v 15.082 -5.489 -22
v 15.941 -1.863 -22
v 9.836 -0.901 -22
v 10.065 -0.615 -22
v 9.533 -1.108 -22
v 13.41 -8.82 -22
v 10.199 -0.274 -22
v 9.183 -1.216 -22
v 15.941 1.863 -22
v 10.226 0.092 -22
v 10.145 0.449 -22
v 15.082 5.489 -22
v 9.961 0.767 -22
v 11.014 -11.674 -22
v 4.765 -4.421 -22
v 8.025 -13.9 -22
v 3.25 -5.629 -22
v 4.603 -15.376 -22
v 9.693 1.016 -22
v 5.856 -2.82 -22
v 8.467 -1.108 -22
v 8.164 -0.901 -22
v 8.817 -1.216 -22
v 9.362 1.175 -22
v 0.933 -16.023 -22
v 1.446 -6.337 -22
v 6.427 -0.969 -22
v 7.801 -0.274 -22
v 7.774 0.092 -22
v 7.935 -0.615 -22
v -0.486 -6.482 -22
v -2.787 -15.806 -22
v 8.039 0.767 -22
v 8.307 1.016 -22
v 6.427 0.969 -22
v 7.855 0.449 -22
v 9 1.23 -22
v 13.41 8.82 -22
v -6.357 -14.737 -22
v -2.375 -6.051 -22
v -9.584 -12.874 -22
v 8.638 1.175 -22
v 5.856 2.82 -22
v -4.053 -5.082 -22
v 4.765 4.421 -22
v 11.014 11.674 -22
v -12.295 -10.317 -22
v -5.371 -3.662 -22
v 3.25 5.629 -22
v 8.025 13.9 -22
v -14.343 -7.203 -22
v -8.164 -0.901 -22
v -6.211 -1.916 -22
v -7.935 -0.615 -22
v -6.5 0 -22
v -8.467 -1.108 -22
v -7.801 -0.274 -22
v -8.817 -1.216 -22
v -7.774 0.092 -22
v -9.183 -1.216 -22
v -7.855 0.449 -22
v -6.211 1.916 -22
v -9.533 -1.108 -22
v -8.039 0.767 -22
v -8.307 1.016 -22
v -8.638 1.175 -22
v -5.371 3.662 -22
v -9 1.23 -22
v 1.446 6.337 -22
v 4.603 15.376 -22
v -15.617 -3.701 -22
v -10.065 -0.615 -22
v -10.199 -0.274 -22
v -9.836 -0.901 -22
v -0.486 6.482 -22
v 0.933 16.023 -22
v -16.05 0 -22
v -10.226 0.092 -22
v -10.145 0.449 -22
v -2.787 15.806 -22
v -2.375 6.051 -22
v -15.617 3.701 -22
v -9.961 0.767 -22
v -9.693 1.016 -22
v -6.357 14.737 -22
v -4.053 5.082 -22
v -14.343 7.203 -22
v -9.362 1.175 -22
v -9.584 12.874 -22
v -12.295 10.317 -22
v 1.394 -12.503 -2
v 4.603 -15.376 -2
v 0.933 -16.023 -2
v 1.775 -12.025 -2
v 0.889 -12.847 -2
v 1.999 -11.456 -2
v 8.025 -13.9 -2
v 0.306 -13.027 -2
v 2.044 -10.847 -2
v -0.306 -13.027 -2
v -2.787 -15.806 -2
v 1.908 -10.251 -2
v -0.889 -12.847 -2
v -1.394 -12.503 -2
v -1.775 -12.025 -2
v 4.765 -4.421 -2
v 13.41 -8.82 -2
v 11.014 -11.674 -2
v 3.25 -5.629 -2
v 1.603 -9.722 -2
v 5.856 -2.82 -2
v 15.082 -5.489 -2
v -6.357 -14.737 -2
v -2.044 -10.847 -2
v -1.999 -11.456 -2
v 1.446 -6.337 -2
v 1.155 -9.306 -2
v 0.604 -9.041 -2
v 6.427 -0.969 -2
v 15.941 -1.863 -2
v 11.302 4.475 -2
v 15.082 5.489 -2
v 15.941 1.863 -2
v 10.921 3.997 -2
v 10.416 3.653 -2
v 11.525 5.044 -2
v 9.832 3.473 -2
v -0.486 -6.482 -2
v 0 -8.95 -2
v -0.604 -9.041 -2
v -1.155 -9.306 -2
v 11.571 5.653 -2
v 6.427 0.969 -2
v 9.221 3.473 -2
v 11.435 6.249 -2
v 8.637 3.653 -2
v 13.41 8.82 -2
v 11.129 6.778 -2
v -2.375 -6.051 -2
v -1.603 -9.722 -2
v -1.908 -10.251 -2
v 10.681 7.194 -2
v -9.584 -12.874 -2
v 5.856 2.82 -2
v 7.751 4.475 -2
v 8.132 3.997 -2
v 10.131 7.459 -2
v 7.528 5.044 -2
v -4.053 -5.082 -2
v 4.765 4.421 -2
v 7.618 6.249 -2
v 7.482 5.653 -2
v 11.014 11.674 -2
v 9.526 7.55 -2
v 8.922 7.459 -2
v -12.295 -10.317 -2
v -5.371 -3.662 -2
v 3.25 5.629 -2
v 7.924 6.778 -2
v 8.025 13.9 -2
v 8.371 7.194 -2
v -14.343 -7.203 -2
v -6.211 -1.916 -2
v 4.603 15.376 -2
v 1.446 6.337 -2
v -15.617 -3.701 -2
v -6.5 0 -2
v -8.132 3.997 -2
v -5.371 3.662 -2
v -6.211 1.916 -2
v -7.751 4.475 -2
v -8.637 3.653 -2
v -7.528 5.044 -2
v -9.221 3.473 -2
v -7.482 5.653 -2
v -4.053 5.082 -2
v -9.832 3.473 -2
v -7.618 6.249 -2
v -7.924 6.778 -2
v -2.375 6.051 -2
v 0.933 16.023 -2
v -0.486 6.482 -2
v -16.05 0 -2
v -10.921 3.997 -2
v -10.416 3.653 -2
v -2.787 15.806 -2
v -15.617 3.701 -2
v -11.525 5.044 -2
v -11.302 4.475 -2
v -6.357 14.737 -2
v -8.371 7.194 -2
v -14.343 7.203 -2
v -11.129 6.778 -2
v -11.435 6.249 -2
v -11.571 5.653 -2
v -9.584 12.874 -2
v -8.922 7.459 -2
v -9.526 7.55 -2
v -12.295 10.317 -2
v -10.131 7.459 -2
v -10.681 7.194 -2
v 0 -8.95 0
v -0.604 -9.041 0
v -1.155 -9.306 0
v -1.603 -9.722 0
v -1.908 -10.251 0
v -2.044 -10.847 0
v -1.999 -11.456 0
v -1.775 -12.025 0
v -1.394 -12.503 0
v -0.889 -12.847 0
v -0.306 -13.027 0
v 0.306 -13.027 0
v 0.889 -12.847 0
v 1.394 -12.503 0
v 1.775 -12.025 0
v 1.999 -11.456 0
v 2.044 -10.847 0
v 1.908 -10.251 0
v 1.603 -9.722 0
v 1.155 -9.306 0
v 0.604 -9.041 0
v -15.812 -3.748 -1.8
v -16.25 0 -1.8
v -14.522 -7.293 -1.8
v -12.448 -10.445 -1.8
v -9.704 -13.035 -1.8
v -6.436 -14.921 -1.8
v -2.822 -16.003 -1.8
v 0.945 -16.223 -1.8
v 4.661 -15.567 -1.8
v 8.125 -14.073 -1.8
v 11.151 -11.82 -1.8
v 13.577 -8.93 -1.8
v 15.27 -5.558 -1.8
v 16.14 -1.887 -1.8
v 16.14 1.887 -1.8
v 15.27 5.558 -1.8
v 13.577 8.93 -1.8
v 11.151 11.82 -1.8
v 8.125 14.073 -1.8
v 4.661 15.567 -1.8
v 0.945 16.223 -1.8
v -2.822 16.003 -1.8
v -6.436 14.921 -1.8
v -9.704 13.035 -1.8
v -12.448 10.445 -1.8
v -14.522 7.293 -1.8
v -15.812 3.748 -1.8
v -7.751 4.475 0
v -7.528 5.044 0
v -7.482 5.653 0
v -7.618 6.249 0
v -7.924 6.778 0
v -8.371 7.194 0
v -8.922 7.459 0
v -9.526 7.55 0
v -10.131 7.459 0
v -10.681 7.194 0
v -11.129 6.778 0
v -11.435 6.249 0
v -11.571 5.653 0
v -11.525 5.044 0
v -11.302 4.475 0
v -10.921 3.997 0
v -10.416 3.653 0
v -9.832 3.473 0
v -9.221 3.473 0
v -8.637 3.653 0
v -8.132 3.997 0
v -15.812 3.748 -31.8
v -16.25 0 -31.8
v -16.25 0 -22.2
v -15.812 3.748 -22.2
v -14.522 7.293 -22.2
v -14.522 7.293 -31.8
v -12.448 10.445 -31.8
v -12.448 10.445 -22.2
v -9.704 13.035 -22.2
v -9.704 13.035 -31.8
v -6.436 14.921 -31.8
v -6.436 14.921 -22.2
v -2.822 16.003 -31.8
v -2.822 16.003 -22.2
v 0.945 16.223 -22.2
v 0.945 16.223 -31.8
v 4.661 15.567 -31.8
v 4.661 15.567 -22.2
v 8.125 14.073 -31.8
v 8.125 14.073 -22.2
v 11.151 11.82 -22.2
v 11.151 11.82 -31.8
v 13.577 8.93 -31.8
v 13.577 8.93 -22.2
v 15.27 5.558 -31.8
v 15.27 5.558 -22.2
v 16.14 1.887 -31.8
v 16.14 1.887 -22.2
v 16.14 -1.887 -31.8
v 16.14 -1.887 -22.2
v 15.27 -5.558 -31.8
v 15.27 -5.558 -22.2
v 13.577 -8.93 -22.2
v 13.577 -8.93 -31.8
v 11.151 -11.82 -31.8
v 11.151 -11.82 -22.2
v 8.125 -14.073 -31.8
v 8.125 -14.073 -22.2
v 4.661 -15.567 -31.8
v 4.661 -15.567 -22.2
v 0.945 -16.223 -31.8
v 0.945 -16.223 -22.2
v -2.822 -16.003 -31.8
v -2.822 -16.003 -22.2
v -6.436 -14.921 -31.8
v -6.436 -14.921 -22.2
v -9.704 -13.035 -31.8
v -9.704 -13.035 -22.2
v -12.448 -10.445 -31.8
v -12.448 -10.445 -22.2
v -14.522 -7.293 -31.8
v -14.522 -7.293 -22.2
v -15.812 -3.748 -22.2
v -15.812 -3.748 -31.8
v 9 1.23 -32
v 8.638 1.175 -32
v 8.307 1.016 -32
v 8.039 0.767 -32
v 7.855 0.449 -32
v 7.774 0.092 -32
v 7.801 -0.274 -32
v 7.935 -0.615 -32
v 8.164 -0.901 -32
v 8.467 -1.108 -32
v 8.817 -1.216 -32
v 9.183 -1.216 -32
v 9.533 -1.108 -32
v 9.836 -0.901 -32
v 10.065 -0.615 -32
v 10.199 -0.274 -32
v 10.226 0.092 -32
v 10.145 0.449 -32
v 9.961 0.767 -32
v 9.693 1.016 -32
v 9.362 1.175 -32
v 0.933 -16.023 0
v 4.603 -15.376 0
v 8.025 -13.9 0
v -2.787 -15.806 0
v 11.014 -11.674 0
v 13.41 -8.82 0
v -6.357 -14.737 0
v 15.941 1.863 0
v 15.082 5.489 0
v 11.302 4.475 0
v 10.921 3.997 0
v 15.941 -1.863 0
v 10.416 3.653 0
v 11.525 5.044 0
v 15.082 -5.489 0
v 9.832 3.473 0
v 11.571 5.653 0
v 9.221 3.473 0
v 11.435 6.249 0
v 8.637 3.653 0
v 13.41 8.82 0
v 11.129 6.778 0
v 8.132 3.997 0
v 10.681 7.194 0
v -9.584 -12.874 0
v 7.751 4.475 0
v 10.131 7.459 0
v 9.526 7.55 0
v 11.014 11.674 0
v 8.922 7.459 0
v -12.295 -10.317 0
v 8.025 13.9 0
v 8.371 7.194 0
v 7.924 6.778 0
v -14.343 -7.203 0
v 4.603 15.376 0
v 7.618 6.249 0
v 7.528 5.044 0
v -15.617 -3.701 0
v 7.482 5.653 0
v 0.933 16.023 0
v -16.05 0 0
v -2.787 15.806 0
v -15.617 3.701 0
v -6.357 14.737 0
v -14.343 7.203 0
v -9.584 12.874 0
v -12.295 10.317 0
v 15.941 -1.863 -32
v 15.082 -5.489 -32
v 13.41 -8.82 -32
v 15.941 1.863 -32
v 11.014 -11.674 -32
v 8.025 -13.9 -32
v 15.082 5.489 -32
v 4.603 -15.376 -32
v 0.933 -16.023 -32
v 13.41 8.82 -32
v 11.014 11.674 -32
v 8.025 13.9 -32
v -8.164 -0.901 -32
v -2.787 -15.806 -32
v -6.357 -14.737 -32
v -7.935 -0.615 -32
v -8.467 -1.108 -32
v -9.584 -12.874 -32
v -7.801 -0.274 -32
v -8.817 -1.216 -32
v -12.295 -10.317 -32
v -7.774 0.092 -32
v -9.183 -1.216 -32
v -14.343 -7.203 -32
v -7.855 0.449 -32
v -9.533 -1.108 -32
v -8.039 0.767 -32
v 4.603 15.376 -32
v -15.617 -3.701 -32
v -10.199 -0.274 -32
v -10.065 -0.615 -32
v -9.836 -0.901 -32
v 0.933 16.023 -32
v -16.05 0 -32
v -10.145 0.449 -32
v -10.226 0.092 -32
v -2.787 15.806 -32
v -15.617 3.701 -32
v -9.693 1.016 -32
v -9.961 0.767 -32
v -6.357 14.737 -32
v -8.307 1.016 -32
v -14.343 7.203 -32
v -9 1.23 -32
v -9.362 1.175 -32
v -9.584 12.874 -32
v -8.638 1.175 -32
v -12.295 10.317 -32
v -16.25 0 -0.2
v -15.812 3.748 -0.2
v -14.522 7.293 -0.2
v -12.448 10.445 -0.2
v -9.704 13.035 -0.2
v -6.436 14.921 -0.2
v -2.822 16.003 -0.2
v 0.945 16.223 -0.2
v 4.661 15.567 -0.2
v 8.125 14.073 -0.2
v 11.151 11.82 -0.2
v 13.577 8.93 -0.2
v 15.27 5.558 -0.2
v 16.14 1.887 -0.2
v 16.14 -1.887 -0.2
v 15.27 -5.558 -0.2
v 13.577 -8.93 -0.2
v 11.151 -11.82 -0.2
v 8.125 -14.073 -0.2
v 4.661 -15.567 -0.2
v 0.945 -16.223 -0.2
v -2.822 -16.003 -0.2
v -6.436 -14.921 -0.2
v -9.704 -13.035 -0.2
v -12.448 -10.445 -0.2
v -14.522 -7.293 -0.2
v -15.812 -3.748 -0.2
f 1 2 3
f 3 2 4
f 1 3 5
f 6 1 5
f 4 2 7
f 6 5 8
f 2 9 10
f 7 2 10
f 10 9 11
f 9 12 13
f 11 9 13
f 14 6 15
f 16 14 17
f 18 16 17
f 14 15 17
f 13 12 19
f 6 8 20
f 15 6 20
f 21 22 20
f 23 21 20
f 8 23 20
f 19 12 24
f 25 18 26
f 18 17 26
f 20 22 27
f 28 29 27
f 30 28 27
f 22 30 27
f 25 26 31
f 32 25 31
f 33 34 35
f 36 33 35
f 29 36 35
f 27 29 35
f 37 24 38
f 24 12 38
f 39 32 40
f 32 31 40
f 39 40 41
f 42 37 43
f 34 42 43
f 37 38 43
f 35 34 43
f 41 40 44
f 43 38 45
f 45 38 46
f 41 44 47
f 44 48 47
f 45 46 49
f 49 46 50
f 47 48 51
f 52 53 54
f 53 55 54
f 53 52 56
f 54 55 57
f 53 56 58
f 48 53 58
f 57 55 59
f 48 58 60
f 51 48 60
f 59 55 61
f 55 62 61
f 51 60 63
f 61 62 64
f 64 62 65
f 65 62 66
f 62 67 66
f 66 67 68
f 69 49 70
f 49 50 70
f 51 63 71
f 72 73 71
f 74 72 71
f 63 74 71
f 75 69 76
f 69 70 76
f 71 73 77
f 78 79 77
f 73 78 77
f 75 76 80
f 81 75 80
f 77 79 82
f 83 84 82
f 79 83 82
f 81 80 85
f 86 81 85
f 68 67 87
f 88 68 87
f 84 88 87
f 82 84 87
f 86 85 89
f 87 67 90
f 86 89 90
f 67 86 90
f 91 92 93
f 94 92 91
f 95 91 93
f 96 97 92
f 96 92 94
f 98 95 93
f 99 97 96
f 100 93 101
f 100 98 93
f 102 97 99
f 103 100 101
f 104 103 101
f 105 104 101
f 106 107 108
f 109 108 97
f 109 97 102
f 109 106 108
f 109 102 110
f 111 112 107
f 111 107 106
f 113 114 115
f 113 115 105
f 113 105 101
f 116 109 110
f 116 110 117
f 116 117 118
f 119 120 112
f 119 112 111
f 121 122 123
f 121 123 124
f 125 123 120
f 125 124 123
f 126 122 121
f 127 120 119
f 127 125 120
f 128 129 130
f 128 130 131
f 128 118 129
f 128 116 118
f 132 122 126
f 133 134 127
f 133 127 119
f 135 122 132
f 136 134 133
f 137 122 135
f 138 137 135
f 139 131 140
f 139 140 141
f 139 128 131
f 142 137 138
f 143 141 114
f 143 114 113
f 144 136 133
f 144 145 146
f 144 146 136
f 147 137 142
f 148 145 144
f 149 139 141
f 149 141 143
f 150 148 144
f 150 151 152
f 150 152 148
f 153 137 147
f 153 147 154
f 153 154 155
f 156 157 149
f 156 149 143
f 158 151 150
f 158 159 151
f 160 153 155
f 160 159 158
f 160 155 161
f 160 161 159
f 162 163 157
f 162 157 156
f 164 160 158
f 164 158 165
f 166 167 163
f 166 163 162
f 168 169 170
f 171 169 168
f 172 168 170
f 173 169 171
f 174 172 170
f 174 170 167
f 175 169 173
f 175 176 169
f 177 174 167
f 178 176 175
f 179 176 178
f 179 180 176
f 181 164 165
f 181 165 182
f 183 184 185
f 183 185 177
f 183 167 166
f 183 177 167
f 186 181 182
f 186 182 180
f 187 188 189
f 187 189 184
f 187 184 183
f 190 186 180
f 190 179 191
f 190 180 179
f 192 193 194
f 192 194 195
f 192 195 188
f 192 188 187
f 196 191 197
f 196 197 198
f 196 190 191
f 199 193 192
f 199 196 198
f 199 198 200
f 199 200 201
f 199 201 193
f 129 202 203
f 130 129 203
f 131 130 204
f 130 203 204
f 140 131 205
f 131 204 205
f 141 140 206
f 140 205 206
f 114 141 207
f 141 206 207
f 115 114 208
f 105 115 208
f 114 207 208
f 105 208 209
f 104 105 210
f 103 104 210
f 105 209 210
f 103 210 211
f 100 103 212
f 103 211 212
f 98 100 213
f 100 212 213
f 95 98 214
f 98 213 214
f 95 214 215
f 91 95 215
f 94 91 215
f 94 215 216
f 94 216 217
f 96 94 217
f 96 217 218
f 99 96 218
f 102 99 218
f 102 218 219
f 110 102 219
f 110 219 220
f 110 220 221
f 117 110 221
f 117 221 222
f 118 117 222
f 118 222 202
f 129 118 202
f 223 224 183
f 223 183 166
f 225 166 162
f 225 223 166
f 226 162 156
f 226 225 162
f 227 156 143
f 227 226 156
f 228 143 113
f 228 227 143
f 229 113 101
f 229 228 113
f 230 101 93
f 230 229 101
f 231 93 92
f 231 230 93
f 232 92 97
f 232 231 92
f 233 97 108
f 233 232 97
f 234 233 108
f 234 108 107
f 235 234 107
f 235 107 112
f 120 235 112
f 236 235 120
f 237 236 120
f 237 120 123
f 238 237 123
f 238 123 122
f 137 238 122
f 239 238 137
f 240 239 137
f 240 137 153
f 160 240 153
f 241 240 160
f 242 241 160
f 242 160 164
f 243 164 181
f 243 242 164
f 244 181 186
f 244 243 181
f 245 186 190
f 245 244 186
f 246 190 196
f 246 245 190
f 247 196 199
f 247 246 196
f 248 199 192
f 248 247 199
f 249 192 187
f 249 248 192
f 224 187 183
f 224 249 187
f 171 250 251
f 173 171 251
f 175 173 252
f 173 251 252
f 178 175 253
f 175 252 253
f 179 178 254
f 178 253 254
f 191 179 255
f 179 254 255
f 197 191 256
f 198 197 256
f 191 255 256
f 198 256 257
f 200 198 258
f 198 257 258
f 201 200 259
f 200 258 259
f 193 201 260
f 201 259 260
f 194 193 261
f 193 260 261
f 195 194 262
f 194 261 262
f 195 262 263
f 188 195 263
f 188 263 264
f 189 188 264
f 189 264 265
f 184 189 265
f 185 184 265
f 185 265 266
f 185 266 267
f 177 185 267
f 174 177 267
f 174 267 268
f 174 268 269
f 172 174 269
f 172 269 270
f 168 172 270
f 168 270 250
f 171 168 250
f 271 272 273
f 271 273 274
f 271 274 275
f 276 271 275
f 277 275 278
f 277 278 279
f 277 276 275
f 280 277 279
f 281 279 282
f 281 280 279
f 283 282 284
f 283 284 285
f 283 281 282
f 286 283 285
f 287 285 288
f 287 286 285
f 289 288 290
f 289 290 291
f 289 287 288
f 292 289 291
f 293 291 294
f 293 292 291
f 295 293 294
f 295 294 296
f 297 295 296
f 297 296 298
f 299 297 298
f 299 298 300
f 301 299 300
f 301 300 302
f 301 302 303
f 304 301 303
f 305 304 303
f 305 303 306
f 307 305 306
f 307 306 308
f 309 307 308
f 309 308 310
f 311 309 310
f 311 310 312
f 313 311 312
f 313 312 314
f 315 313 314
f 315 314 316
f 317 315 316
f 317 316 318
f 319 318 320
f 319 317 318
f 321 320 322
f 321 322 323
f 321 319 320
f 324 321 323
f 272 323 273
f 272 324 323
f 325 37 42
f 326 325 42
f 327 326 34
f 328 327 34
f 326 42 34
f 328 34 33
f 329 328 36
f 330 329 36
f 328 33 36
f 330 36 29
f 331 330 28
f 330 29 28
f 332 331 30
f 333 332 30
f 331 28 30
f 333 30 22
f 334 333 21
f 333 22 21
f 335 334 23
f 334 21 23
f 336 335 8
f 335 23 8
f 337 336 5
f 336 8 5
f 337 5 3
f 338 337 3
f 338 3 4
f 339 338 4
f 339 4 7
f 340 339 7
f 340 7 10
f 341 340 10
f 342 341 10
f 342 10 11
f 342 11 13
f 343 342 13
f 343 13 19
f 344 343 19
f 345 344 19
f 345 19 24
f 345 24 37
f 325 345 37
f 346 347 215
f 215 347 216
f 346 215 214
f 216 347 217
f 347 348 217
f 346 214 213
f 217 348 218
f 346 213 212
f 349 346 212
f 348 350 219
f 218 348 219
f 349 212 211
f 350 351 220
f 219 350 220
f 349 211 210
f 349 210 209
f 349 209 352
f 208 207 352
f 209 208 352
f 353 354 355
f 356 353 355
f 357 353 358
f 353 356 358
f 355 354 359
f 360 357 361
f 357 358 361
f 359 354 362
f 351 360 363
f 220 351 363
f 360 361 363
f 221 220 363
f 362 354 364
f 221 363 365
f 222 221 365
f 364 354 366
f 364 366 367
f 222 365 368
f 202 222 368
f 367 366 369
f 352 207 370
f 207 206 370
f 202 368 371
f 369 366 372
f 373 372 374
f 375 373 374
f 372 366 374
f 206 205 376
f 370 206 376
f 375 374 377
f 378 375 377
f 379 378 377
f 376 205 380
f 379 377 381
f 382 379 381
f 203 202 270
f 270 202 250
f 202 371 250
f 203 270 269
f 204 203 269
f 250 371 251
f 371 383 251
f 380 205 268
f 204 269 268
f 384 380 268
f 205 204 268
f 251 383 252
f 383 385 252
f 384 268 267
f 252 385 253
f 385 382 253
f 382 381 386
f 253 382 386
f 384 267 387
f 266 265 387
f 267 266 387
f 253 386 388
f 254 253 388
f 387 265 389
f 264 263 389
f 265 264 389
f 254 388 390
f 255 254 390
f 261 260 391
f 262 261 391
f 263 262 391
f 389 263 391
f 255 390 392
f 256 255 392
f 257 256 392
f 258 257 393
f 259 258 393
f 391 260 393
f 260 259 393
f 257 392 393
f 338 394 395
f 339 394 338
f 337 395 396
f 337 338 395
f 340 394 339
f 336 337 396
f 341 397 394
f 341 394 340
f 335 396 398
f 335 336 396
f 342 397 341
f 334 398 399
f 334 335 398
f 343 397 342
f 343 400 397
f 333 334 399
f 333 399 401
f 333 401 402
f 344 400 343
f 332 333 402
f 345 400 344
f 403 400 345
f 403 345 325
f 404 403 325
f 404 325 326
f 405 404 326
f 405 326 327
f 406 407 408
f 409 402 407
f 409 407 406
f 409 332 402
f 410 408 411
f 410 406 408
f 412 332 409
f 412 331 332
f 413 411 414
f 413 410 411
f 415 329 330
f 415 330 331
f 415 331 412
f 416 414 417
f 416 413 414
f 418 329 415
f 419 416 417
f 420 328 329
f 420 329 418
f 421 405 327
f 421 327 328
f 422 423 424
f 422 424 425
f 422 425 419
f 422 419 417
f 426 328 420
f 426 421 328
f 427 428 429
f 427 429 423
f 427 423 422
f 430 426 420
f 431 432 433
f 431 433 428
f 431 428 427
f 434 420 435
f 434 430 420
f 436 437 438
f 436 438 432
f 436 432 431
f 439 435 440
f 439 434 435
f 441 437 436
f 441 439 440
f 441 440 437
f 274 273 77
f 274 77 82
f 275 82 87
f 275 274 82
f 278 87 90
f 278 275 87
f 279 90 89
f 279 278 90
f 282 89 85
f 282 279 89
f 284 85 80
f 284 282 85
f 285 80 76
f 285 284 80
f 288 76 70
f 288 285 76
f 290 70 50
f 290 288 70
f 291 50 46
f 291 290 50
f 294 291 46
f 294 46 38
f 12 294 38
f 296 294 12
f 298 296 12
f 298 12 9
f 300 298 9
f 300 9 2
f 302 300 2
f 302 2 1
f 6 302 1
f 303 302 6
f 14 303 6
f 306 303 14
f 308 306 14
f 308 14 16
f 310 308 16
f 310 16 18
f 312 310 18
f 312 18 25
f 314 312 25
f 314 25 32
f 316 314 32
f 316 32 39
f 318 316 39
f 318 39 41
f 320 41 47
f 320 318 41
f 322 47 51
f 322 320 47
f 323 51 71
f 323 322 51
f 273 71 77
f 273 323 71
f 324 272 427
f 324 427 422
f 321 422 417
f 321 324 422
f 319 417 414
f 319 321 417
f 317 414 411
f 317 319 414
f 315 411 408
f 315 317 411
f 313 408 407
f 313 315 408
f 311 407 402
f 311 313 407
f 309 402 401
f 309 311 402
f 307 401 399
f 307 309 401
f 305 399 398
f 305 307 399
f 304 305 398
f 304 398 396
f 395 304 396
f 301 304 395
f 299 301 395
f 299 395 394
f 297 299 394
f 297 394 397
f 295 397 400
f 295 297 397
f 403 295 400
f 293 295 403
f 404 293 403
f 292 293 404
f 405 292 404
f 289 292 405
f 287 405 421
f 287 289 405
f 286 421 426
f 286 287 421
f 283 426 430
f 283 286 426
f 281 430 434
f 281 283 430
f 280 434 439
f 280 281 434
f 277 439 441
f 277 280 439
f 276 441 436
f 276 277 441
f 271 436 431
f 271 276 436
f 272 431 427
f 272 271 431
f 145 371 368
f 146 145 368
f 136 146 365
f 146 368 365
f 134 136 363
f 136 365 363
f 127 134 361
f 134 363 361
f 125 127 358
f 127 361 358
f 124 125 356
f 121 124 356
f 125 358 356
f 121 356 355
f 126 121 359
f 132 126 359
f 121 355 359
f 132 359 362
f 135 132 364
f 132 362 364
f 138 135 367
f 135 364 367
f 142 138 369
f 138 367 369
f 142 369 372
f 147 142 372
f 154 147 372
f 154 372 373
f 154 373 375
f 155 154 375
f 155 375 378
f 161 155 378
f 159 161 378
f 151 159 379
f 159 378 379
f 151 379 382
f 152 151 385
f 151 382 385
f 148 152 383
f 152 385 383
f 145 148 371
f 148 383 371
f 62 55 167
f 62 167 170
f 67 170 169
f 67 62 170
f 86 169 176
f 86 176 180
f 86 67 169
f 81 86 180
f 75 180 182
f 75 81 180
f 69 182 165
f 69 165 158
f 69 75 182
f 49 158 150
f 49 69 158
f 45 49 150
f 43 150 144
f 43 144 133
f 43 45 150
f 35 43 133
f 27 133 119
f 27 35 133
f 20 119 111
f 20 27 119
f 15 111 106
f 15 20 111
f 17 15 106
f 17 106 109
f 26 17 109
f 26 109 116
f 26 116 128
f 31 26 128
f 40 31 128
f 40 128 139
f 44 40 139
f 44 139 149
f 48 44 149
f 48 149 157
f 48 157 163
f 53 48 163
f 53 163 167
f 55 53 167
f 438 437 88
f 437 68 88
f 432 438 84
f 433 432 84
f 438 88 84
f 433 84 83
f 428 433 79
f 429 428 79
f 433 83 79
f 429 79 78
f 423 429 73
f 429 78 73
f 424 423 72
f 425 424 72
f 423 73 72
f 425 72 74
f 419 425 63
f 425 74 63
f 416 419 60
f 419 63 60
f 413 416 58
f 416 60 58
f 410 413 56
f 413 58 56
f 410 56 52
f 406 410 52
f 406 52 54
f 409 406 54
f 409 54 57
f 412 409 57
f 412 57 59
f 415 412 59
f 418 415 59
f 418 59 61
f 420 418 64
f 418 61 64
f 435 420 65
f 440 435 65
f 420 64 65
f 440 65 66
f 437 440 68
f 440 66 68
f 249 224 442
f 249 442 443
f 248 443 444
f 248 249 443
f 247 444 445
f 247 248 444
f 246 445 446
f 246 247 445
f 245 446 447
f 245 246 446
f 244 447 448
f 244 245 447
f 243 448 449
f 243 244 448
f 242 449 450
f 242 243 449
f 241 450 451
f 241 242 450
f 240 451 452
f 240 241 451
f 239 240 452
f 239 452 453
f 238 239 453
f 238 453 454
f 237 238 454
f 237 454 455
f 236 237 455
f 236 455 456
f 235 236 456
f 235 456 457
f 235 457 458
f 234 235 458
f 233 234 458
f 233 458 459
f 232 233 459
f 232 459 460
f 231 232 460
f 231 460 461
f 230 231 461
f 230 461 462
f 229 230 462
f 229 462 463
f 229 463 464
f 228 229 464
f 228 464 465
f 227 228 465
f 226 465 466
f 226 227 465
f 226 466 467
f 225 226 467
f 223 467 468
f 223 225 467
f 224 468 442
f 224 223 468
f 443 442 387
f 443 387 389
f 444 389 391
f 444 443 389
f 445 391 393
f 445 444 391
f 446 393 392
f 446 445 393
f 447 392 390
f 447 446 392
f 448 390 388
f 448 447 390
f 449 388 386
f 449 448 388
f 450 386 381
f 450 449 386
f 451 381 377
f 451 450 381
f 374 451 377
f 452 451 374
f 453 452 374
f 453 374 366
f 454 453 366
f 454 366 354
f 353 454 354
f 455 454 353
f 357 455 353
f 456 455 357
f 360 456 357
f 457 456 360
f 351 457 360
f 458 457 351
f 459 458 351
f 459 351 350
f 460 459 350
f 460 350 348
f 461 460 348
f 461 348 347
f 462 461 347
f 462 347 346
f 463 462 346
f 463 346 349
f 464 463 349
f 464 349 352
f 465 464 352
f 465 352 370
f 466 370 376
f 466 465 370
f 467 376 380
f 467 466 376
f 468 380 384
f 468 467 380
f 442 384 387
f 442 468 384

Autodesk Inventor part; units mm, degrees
ref_plane "YZ Plane" through (0, 0, 0) normal (1, 0, 0) x (0, 1, 0)
ref_plane "XZ Plane" through (0, 0, 0) normal (0, 1, 0) x (-1, 0, 0)
ref_plane "XY Plane" through (0, 0, 0) normal (0, 0, 1) x (1, 0, 0)
sketch "Sketch1" plane through (0, 0, 0) normal (0, 1, 0) x (-1, 0, 0)
  line L0 (6.5, -2) -> (6.5, -22)
  line L1 (16.25, -22) -> (16.25, -32)
  line L2 (16.25, 0) -> (16.25, -2)
  line L3 (0, 0) -> (0, -32)
  line L4 (16.25, 0) -> (0, 0)
  line L5 (16.25, -2) -> (6.5, -2)
  line L6 (16.25, -22) -> (6.5, -22)
  line L7 (16.25, -32) -> (0, -32)
  point P0 (0, 26.9125)
  point P1 (0, -16.1673)
  point P2 (0, 6.9125)
  point P3 (0, -16)
  dimension "d19" = 20
  dimension "d20" = 10
  dimension "d21" = 2
  dimension "d22" = 32.5
  dimension "d23" = 13
  dimension "d24" = 32.5
revolve "Revolution1" add sketch "Sketch1" angle 360 about axis through (0, 0, 0) along (0, 0, -1)
sketch "Sketch3" plane through (0, 0, -2) normal (0, 0, -1) x (-1, 0, 0)
  circle A0 centre (0, 0) radius 11 construction
  point P0 (0, -11)
  dimension "d25" = 22
hole "Hole2" at (0, -11, -2) direction (0, 0, 1) diameter 4.1 end through all
pattern_circular "Circular Pattern2" count 3 over 360 about axis through (0, 0, -10) along (0, 0, 1) of "Hole2"
sketch "Sketch4" plane through (0, 0, -32) normal (0, 0, -1) x (-1, 0, 0)
  line L0 (9, 0) -> (-9, 0) construction
  point P0 (0, 0)
  point P1 (0, 0)
  dimension "d36" = 18
hole "Hole3" at (-9, 0, -32) at (9, 0, -32) direction (0, 0, 1) diameter 2.459 depth 10 thread size "M3x0.5" class "6H" standard "ANSI Metric M Profile"
chamfer "Chamfer1" distance 0.2 angle 45 4 edges at (16.25, 0, -32) (16.25, 0, -22) (16.25, 0, -2) (16.25, 0, 0)
equation "\"d23\" = stockid"
equation "\"d25\" = holesid"
equation "\"holesid\" = 22"
equation "\"stockid\" = 13"
properties part number "HayashiProbeHead" material "Stainless Steel"
